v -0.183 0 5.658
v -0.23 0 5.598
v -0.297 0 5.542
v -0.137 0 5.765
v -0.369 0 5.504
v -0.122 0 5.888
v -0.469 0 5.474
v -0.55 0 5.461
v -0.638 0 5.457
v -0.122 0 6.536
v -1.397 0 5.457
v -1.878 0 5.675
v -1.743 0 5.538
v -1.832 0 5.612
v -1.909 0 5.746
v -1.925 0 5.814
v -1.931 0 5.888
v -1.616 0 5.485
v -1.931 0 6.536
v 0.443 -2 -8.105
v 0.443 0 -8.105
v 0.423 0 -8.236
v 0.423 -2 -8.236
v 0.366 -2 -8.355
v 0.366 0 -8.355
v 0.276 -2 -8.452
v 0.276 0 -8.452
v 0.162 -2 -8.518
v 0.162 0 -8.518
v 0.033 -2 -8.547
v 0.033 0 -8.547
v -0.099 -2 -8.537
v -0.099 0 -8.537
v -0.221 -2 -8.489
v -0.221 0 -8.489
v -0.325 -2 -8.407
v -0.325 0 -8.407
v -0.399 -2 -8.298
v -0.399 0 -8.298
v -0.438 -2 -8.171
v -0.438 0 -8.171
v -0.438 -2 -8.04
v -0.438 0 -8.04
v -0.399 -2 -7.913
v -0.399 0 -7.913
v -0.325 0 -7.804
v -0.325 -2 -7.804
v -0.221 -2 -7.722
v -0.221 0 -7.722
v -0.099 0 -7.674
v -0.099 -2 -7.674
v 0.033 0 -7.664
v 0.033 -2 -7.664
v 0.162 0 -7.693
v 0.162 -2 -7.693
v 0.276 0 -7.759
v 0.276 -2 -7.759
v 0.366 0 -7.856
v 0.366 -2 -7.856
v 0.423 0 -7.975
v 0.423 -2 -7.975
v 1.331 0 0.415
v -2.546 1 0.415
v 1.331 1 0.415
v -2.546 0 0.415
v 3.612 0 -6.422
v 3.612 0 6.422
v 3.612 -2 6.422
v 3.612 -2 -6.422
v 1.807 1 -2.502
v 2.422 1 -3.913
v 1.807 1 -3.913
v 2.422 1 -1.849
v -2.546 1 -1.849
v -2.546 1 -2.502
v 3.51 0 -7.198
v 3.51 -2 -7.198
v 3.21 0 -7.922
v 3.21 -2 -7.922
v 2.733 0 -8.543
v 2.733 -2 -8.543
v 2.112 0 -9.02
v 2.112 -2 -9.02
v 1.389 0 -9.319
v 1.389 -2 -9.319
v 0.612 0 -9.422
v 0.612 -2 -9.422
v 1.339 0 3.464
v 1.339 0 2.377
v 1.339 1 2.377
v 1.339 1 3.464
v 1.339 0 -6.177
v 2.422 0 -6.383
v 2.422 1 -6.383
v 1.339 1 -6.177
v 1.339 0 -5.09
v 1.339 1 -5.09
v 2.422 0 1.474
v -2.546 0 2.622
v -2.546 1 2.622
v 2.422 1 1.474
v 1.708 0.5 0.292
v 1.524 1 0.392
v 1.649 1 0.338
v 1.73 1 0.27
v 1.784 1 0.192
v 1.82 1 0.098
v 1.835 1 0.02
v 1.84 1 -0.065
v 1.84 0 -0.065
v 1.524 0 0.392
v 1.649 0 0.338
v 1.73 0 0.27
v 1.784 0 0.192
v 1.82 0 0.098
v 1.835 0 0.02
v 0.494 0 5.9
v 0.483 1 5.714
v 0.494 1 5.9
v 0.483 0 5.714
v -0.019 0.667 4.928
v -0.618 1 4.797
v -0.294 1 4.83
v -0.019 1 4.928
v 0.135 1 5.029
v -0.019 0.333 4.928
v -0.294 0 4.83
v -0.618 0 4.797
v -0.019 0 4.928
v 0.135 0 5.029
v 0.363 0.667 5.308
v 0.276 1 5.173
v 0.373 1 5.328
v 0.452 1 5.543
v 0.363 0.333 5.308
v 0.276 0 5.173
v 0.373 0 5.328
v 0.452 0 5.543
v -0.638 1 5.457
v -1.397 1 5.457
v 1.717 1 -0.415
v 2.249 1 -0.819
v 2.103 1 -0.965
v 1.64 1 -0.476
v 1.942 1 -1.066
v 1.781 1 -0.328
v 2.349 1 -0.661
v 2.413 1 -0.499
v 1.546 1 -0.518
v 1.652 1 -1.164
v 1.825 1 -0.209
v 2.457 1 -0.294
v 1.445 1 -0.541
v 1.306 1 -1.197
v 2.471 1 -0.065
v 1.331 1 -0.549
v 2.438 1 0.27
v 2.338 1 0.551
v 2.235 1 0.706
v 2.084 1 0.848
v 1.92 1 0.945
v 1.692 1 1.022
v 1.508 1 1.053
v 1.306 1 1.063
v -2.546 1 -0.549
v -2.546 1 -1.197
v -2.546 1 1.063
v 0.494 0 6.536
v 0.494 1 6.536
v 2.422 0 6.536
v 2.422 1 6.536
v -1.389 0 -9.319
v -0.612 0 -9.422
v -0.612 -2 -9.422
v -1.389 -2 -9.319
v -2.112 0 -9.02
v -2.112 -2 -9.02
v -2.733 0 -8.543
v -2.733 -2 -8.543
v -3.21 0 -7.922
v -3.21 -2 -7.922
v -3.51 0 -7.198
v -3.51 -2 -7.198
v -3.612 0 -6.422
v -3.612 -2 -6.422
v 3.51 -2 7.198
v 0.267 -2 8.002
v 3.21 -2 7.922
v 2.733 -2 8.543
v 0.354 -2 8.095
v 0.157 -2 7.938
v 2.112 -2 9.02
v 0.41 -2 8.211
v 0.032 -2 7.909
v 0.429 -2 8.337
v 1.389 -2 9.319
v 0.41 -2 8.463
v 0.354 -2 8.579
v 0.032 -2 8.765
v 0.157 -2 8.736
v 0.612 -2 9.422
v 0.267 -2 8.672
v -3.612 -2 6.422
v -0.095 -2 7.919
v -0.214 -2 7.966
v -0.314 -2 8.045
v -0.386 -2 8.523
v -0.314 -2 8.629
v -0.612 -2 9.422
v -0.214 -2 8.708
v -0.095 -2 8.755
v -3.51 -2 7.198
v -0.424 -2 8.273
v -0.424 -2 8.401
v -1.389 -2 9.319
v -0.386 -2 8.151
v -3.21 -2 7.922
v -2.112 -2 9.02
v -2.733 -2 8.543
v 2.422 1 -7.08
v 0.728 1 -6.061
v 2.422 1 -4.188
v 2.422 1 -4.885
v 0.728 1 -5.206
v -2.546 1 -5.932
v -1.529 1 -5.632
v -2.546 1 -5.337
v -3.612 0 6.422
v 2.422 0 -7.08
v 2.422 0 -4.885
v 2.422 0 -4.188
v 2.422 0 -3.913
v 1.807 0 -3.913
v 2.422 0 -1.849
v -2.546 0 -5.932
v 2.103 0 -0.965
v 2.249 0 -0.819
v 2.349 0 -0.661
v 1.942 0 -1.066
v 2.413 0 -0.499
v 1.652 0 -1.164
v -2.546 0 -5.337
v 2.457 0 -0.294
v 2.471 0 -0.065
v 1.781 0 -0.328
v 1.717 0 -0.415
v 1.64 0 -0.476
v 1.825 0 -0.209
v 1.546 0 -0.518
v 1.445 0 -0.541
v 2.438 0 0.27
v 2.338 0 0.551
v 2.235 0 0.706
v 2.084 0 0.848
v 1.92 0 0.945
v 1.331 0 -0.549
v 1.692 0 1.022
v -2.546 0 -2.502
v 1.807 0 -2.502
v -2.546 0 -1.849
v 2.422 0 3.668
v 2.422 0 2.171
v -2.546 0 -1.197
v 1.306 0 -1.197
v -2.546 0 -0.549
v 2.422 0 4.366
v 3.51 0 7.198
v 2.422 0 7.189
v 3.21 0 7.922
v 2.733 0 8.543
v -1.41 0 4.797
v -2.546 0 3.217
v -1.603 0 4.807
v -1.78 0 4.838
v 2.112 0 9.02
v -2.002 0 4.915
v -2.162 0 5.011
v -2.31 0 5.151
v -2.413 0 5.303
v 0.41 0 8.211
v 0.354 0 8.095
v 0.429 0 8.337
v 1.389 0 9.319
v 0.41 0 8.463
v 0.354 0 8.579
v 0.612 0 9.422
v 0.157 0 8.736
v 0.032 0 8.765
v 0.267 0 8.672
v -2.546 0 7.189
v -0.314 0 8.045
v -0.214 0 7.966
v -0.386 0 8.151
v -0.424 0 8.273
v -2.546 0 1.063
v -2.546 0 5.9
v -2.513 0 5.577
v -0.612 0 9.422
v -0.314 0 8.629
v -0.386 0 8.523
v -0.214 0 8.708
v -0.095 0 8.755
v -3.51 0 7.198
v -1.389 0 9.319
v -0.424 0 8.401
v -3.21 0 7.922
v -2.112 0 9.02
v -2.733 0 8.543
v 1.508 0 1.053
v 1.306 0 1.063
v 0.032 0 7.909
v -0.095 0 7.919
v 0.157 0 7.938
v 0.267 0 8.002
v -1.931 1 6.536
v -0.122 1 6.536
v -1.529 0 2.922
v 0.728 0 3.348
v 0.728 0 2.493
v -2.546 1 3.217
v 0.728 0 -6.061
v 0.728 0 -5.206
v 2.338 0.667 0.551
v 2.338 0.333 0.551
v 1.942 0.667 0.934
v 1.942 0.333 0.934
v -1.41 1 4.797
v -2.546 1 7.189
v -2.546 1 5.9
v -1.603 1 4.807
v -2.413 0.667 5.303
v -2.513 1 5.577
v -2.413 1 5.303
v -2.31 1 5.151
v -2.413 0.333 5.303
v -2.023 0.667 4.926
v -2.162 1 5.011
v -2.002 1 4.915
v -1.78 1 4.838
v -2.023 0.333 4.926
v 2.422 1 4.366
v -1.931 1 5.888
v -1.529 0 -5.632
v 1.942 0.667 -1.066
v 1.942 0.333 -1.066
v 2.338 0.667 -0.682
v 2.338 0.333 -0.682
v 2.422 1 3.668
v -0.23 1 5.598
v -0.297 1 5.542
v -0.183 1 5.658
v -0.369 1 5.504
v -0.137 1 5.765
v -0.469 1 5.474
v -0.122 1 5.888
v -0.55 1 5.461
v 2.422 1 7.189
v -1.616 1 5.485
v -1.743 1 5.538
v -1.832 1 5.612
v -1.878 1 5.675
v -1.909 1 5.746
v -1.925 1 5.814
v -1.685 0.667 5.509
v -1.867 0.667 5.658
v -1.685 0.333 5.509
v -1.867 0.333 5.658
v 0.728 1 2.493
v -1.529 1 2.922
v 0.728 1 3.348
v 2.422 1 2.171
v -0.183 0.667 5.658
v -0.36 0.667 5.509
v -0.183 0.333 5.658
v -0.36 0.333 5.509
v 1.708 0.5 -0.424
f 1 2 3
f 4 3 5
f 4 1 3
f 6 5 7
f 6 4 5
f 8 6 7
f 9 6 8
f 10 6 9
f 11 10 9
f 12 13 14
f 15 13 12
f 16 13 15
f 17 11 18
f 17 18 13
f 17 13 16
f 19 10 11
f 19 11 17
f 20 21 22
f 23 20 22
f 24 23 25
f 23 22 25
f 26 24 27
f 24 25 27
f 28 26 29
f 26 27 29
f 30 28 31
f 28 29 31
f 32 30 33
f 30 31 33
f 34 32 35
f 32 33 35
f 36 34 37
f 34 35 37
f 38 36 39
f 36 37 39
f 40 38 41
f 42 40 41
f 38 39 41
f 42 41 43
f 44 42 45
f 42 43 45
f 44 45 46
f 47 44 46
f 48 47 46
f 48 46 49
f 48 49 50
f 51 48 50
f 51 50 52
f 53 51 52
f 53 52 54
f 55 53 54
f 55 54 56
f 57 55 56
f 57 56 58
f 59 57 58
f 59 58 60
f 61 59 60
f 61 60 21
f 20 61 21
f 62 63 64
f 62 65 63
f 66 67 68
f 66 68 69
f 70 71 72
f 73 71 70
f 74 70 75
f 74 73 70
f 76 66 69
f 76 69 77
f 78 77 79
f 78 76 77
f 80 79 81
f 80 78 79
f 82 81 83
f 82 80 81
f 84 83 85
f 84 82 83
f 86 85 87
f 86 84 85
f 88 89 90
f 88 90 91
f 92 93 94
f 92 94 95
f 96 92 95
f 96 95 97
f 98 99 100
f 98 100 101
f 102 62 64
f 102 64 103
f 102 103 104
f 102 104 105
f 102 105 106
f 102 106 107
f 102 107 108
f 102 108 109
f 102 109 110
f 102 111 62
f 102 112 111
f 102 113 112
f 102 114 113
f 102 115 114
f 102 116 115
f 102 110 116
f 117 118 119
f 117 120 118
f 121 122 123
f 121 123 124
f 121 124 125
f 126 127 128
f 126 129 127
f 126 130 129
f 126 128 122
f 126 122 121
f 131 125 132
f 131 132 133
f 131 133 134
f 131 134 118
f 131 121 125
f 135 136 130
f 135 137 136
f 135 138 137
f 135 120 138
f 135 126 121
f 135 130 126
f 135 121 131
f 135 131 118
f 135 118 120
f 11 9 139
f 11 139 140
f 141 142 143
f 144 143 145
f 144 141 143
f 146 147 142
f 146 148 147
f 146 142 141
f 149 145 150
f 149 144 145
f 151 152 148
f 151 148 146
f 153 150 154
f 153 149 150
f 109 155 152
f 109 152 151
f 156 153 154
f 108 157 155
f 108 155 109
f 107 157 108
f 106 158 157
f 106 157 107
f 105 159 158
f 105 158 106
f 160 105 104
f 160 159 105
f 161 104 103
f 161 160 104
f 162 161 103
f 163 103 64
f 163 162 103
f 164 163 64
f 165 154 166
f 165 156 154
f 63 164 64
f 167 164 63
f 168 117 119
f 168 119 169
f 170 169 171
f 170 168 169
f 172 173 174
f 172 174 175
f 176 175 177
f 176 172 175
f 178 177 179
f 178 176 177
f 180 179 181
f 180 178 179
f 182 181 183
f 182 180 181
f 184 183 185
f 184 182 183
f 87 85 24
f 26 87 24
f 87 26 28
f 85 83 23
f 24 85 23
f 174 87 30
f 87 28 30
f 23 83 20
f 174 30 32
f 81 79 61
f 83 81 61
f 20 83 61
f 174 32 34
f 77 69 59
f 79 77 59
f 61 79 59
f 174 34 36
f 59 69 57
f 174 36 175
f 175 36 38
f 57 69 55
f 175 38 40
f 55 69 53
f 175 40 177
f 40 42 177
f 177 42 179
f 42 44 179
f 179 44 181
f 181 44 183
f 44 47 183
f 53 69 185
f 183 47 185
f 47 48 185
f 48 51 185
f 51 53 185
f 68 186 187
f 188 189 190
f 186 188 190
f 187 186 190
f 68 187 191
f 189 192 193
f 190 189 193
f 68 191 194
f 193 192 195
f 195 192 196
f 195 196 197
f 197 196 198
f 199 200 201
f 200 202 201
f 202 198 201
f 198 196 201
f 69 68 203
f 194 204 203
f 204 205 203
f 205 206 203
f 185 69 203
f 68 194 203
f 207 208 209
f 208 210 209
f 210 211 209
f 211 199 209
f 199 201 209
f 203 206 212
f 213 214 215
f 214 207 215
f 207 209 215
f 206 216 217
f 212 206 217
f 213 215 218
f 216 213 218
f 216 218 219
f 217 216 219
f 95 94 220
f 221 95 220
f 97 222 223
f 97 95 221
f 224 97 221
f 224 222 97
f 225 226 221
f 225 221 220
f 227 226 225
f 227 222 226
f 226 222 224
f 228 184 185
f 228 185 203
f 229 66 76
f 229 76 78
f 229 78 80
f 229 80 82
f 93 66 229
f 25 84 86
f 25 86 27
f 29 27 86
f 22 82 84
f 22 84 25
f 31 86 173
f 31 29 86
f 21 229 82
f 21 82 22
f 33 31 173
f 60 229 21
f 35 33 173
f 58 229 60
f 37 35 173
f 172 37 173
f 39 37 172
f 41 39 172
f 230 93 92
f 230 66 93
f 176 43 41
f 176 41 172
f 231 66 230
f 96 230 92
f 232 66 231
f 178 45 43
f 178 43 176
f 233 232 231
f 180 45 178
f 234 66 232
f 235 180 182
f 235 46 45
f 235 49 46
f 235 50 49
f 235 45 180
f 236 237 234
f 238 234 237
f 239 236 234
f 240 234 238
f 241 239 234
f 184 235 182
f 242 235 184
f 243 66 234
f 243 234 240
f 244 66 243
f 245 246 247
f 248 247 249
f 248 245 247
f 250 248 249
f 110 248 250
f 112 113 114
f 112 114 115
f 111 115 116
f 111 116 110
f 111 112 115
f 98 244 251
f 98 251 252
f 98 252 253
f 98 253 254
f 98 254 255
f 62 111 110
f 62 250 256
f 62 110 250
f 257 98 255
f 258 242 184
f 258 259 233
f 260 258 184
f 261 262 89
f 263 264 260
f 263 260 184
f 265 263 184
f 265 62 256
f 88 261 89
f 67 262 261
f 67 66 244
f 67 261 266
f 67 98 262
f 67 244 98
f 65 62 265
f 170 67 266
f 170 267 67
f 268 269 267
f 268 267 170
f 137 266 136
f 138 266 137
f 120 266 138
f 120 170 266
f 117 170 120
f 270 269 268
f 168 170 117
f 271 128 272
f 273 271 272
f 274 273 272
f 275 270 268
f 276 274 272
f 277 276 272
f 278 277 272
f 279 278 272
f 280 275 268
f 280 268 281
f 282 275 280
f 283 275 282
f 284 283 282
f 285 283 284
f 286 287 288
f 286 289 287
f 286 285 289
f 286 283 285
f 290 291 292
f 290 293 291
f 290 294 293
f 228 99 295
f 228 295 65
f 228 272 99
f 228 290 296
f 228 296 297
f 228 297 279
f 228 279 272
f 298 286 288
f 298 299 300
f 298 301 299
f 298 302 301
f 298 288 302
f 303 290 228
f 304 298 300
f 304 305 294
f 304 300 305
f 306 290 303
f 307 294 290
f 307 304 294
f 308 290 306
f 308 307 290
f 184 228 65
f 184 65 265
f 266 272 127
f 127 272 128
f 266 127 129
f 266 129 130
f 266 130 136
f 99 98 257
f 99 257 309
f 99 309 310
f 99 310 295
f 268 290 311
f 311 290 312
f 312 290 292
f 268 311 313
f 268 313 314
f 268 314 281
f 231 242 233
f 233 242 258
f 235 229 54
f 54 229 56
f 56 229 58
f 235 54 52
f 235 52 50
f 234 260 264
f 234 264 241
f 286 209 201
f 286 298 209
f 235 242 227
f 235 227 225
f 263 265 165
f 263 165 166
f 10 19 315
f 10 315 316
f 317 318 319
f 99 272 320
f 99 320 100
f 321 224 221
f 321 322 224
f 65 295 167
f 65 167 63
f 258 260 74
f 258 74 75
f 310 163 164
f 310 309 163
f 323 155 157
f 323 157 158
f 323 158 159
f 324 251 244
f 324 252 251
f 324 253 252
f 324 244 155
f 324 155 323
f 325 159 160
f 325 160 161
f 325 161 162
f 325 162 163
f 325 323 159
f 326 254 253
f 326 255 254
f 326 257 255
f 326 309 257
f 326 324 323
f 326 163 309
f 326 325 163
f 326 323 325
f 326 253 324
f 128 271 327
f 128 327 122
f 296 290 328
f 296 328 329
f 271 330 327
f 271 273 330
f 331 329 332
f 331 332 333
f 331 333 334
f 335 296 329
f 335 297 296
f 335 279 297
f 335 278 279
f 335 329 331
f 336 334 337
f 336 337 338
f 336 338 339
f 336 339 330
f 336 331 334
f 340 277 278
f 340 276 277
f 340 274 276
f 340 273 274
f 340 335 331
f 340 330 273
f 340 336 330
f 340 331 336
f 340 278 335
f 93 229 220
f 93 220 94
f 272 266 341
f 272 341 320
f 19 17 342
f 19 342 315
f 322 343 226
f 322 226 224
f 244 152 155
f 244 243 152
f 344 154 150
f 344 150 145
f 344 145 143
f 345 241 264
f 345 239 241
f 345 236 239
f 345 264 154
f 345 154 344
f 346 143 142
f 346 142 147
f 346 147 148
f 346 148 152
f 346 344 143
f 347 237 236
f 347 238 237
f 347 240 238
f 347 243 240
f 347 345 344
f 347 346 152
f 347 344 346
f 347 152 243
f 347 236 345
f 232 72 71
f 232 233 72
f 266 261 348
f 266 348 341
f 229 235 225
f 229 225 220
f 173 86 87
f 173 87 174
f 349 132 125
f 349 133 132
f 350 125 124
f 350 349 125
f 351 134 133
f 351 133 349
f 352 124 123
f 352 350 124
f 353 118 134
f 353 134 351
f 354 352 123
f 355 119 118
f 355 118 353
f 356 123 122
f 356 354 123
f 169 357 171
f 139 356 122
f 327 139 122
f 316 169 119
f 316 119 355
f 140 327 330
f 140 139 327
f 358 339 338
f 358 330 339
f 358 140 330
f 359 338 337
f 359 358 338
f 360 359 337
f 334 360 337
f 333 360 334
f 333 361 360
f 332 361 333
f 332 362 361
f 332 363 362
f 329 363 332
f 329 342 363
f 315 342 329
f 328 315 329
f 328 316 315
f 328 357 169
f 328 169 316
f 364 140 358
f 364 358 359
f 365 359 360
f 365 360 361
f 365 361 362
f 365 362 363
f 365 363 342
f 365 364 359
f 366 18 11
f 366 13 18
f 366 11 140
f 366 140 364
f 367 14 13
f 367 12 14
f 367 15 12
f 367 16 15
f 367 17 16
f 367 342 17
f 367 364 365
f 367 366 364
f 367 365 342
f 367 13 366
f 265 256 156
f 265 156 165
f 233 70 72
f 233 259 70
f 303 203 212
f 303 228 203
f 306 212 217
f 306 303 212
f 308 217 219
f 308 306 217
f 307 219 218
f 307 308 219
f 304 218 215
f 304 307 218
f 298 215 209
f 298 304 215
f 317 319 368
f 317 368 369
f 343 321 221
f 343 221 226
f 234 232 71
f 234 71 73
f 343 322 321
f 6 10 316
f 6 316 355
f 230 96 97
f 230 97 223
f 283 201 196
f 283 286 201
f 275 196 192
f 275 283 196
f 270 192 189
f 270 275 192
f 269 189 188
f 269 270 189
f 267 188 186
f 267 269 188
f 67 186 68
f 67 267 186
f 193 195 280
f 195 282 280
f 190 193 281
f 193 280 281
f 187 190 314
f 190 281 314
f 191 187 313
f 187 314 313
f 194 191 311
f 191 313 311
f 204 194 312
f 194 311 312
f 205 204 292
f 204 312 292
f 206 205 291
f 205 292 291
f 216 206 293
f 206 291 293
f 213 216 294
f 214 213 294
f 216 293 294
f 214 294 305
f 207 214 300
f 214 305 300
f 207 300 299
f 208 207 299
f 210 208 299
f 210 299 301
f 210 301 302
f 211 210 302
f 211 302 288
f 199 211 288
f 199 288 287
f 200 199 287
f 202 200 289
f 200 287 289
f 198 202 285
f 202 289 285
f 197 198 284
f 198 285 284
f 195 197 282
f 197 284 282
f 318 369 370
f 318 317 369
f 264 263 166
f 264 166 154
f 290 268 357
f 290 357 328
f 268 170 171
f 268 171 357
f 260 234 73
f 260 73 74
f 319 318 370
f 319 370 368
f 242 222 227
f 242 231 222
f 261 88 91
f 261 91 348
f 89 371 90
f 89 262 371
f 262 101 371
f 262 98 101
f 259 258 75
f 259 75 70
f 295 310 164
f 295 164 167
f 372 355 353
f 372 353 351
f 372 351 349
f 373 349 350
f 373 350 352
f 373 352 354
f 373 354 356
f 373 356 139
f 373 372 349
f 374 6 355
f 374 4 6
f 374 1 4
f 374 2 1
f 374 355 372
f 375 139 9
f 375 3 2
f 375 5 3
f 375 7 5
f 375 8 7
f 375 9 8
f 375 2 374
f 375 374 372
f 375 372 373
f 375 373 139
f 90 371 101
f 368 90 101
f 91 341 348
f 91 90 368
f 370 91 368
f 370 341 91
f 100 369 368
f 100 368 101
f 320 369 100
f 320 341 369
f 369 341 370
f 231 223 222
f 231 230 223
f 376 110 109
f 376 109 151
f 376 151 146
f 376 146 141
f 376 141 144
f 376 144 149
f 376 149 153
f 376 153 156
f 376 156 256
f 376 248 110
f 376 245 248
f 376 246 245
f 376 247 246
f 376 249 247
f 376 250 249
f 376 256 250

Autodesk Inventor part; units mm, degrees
ref_plane "YZ Plane" through (0, 0, 0) normal (1, 0, 0) x (0, 1, 0)
ref_plane "XZ Plane" through (0, 0, 0) normal (0, 1, 0) x (-1, 0, 0)
ref_plane "XY Plane" through (0, 0, 0) normal (0, 0, 1) x (1, 0, 0)
sketch "Sketch1" plane through (0, 0, 0) normal (0, 1, 0) x (-1, 0, 0)
  line L0 (0.6121, 9.4217) -> (-0.6121, 9.4217)
  line L1 (-3.6121, 6.4217) -> (-3.6121, -6.4217)
  line L2 (-0.6121, -9.4217) -> (0.6121, -9.4217)
  line L3 (3.6121, -6.4217) -> (3.6121, 6.4217)
  line L4 (3.6121, 9.4217) -> (-3.6121, -9.4217) construction
  line L5 (-3.6121, 9.4217) -> (3.6121, -9.4217) construction
  arc A0 (3.6121, 6.4217) -> (0.6121, 9.4217) centre (0.6121, 6.4217) ccw
  arc A1 (-0.6121, 9.4217) -> (-3.6121, 6.4217) centre (-0.6121, 6.4217) ccw
  arc A2 (0.6121, -9.4217) -> (3.6121, -6.4217) centre (0.6121, -6.4217) ccw
  arc A3 (-3.6121, -6.4217) -> (-0.6121, -9.4217) centre (-0.6121, -6.4217) ccw
  line L6 (2.5462, 7.5291) -> (2.5462, -7.1828) construction
  line L7 (2.5462, -7.1828) -> (-2.4754, -7.1828) construction
  line L8 (-2.4754, -7.1828) -> (-2.4754, 7.5291) construction
  line L9 (-2.4754, 7.5291) -> (2.5462, 7.5291) construction
  line L10 (0.1215, 6.8275) -> (0.1215, 5.888)
  spline S0 degree 2 poles (0.1215, 5.888) (0.1215, 5.7568) (0.2446, 5.5598) (0.4744, 5.4573) (0.6385, 5.4573) knots 0 0 0 1 2 3 3 3
  line L11 (0.6385, 5.4573) -> (1.3974, 5.4573)
  spline S1 degree 2 poles (1.3974, 5.4573) (1.5656, 5.4573) (1.8036, 5.5598) (1.9308, 5.7568) (1.9308, 5.888) knots 0 0 0 1 2 3 3 3
  line L12 (1.9308, 5.888) -> (1.9308, 6.8275)
  line L13 (1.9308, 6.8275) -> (2.5462, 6.8275)
  line L14 (2.5462, 6.8275) -> (2.5462, 5.9004)
  spline S2 degree 2 poles (2.5462, 5.9004) (2.5462, 5.5516) (2.2795, 5.0552) (1.7667, 4.7968) (1.4097, 4.7968) knots 0 0 0 1 2 3 3 3
  line L15 (1.4097, 4.7968) -> (0.6179, 4.7968)
  spline S3 degree 2 poles (0.6179, 4.7968) (0.2692, 4.7968) (-0.2313, 5.0593) (-0.4939, 5.5557) (-0.4939, 5.9004) knots 0 0 0 1 2 3 3 3
  line L16 (-0.4939, 5.9004) -> (-0.4939, 6.8275)
  line L17 (-0.4939, 6.8275) -> (0.1215, 6.8275)
  line L18 (2.5462, 7.1886) -> (2.5462, 6.5363)
  line L19 (2.5462, 6.5363) -> (-2.4221, 6.5363)
  line L20 (-2.4221, 6.5363) -> (-2.4221, 7.1886)
  line L21 (-2.4221, 7.1886) -> (2.5462, 7.1886)
  line L22 (2.5462, 3.2173) -> (2.5462, 2.6224)
  line L23 (2.5462, 2.6224) -> (-2.4221, 1.4737)
  line L24 (-2.4221, 1.4737) -> (-2.4221, 2.1711)
  line L25 (-2.4221, 2.1711) -> (1.5287, 2.9219)
  line L26 (1.5287, 2.9219) -> (-2.4221, 3.6685)
  line L27 (-2.4221, 3.6685) -> (-2.4221, 4.366)
  line L28 (-2.4221, 4.366) -> (2.5462, 3.2173)
  line L29 (-0.7277, 3.6316) -> (-0.7277, 2.1588)
  line L30 (-0.7277, 2.1588) -> (-1.339, 2.1588)
  line L31 (-1.339, 2.1588) -> (-1.339, 3.6316)
  line L32 (-1.339, 3.6316) -> (-0.7277, 3.6316)
  spline S4 degree 2 poles (-2.4713, -0.0648) (-2.4713, 0.2962) (-2.2046, 0.8049) (-1.6795, 1.0634) (-1.3062, 1.0634) knots 0 0 0 1 2 3 3 3
  line L33 (-1.3062, 1.0634) -> (2.5462, 1.0634)
  line L34 (2.5462, 1.0634) -> (2.5462, 0.4152)
  line L35 (2.5462, 0.4152) -> (-1.3308, 0.4152)
  spline S5 degree 2 poles (-1.3308, 0.4152) (-1.5769, 0.4152) (-1.8395, 0.169) (-1.8395, -0.0648) knots 0 0 0 1 2 2 2
  spline S6 degree 2 poles (-1.8395, -0.0648) (-1.8395, -0.2987) (-1.5769, -0.5489) (-1.3308, -0.5489) knots 0 0 0 1 2 2 2
  line L36 (-1.3308, -0.5489) -> (2.5462, -0.5489)
  line L37 (2.5462, -0.5489) -> (2.5462, -1.1971)
  line L38 (2.5462, -1.1971) -> (-1.3062, -1.1971)
  spline S7 degree 2 poles (-1.3062, -1.1971) (-1.6795, -1.1971) (-2.2046, -0.9346) (-2.4713, -0.4299) (-2.4713, -0.0648) knots 0 0 0 1 2 3 3 3
  line L39 (2.5462, -1.8494) -> (2.5462, -2.5018)
  line L40 (2.5462, -2.5018) -> (-2.4221, -2.5018)
  line L41 (-2.4221, -2.5018) -> (-2.4221, -1.8494)
  line L42 (-2.4221, -1.8494) -> (2.5462, -1.8494)
  line L43 (-1.8067, -2.1982) -> (-1.8067, -3.913)
  line L44 (-1.8067, -3.913) -> (-2.4221, -3.913)
  line L45 (-2.4221, -3.913) -> (-2.4221, -2.1982)
  line L46 (-2.4221, -2.1982) -> (-1.8067, -2.1982)
  line L47 (2.5462, -5.3366) -> (2.5462, -5.9315)
  line L48 (2.5462, -5.9315) -> (-2.4221, -7.0802)
  line L49 (-2.4221, -7.0802) -> (-2.4221, -6.3828)
  line L50 (-2.4221, -6.3828) -> (1.5287, -5.632)
  line L51 (1.5287, -5.632) -> (-2.4221, -4.8854)
  line L52 (-2.4221, -4.8854) -> (-2.4221, -4.1879)
  line L53 (-2.4221, -4.1879) -> (2.5462, -5.3366)
  line L54 (-0.7277, -4.9223) -> (-0.7277, -6.3951)
  line L55 (-0.7277, -6.3951) -> (-1.339, -6.3951)
  line L56 (-1.339, -6.3951) -> (-1.339, -4.9223)
  line L57 (-1.339, -4.9223) -> (-0.7277, -4.9223)
  point P0 (0, 0)
  dimension "d0" = 3
extrude "Extrusion1" add sketch "Sketch1" against normal blind 2 contours A0 L3 A2 L2 A3 L1 A1 L0 | L17 L16 L19 L20 L21 L18 L13 L12 L10 | L10 L19 L16 L17 | L19 L12 S1 L11 S0 L10 | L10 S0 L11 S1 L12 L19 L14 S2 L15 S3 L16 | L12 L13 L14 L19 | L22 L23 L24 L25 L31 L30 L29 L26 L32 L27 L28 | L31 L32 L29 L26 | L26 L29 L25 L31 | L25 L29 L30 L31 | L26 L25 L29 | S4 L33 L34 L35 S5 S6 L36 L37 L38 S7 | L39 L40 L43 L46 L41 L42 | L43 L44 L45 L40 | L40 L41 L46 L43 | L47 L48 L49 L50 L56 L55 L54 L51 L57 L52 L53 | L56 L57 L54 L51 | L51 L54 L50 L56 | L50 L54 L55 L56 | L51 L50 L54
extrude "Extrusion2" add sketch "Sketch1" along normal blind 1 contours L17 L16 L19 L20 L21 L18 L13 L12 L10 | L10 L19 L16 L17 | L10 S0 L11 S1 L12 L19 L14 S2 L15 S3 L16 | L12 L13 L14 L19 | L22 L23 L24 L25 L31 L30 L29 L26 L32 L27 L28 | L31 L32 L29 L26 | L26 L29 L25 L31 | L25 L29 L30 L31 | S4 L33 L34 L35 S5 S6 L36 L37 L38 S7 | L39 L40 L43 L46 L41 L42 | L43 L44 L45 L40 | L40 L41 L46 L43 | L47 L48 L49 L50 L56 L55 L54 L51 L57 L52 L53 | L56 L57 L54 L51 | L51 L54 L50 L56 | L50 L54 L55 L56
sketch "Sketch2" plane through (0, 0, 0) normal (0, 1, 0) x (1, 0, 0)
  circle A0 centre (0, -8.337) radius 0.4289
  circle A1 centre (0, 8.1055) radius 0.4428
  point P0 (0, 0)
extrude "Extrusion3" cut sketch "Sketch2" against normal through all
properties part number "_3DPrint"
